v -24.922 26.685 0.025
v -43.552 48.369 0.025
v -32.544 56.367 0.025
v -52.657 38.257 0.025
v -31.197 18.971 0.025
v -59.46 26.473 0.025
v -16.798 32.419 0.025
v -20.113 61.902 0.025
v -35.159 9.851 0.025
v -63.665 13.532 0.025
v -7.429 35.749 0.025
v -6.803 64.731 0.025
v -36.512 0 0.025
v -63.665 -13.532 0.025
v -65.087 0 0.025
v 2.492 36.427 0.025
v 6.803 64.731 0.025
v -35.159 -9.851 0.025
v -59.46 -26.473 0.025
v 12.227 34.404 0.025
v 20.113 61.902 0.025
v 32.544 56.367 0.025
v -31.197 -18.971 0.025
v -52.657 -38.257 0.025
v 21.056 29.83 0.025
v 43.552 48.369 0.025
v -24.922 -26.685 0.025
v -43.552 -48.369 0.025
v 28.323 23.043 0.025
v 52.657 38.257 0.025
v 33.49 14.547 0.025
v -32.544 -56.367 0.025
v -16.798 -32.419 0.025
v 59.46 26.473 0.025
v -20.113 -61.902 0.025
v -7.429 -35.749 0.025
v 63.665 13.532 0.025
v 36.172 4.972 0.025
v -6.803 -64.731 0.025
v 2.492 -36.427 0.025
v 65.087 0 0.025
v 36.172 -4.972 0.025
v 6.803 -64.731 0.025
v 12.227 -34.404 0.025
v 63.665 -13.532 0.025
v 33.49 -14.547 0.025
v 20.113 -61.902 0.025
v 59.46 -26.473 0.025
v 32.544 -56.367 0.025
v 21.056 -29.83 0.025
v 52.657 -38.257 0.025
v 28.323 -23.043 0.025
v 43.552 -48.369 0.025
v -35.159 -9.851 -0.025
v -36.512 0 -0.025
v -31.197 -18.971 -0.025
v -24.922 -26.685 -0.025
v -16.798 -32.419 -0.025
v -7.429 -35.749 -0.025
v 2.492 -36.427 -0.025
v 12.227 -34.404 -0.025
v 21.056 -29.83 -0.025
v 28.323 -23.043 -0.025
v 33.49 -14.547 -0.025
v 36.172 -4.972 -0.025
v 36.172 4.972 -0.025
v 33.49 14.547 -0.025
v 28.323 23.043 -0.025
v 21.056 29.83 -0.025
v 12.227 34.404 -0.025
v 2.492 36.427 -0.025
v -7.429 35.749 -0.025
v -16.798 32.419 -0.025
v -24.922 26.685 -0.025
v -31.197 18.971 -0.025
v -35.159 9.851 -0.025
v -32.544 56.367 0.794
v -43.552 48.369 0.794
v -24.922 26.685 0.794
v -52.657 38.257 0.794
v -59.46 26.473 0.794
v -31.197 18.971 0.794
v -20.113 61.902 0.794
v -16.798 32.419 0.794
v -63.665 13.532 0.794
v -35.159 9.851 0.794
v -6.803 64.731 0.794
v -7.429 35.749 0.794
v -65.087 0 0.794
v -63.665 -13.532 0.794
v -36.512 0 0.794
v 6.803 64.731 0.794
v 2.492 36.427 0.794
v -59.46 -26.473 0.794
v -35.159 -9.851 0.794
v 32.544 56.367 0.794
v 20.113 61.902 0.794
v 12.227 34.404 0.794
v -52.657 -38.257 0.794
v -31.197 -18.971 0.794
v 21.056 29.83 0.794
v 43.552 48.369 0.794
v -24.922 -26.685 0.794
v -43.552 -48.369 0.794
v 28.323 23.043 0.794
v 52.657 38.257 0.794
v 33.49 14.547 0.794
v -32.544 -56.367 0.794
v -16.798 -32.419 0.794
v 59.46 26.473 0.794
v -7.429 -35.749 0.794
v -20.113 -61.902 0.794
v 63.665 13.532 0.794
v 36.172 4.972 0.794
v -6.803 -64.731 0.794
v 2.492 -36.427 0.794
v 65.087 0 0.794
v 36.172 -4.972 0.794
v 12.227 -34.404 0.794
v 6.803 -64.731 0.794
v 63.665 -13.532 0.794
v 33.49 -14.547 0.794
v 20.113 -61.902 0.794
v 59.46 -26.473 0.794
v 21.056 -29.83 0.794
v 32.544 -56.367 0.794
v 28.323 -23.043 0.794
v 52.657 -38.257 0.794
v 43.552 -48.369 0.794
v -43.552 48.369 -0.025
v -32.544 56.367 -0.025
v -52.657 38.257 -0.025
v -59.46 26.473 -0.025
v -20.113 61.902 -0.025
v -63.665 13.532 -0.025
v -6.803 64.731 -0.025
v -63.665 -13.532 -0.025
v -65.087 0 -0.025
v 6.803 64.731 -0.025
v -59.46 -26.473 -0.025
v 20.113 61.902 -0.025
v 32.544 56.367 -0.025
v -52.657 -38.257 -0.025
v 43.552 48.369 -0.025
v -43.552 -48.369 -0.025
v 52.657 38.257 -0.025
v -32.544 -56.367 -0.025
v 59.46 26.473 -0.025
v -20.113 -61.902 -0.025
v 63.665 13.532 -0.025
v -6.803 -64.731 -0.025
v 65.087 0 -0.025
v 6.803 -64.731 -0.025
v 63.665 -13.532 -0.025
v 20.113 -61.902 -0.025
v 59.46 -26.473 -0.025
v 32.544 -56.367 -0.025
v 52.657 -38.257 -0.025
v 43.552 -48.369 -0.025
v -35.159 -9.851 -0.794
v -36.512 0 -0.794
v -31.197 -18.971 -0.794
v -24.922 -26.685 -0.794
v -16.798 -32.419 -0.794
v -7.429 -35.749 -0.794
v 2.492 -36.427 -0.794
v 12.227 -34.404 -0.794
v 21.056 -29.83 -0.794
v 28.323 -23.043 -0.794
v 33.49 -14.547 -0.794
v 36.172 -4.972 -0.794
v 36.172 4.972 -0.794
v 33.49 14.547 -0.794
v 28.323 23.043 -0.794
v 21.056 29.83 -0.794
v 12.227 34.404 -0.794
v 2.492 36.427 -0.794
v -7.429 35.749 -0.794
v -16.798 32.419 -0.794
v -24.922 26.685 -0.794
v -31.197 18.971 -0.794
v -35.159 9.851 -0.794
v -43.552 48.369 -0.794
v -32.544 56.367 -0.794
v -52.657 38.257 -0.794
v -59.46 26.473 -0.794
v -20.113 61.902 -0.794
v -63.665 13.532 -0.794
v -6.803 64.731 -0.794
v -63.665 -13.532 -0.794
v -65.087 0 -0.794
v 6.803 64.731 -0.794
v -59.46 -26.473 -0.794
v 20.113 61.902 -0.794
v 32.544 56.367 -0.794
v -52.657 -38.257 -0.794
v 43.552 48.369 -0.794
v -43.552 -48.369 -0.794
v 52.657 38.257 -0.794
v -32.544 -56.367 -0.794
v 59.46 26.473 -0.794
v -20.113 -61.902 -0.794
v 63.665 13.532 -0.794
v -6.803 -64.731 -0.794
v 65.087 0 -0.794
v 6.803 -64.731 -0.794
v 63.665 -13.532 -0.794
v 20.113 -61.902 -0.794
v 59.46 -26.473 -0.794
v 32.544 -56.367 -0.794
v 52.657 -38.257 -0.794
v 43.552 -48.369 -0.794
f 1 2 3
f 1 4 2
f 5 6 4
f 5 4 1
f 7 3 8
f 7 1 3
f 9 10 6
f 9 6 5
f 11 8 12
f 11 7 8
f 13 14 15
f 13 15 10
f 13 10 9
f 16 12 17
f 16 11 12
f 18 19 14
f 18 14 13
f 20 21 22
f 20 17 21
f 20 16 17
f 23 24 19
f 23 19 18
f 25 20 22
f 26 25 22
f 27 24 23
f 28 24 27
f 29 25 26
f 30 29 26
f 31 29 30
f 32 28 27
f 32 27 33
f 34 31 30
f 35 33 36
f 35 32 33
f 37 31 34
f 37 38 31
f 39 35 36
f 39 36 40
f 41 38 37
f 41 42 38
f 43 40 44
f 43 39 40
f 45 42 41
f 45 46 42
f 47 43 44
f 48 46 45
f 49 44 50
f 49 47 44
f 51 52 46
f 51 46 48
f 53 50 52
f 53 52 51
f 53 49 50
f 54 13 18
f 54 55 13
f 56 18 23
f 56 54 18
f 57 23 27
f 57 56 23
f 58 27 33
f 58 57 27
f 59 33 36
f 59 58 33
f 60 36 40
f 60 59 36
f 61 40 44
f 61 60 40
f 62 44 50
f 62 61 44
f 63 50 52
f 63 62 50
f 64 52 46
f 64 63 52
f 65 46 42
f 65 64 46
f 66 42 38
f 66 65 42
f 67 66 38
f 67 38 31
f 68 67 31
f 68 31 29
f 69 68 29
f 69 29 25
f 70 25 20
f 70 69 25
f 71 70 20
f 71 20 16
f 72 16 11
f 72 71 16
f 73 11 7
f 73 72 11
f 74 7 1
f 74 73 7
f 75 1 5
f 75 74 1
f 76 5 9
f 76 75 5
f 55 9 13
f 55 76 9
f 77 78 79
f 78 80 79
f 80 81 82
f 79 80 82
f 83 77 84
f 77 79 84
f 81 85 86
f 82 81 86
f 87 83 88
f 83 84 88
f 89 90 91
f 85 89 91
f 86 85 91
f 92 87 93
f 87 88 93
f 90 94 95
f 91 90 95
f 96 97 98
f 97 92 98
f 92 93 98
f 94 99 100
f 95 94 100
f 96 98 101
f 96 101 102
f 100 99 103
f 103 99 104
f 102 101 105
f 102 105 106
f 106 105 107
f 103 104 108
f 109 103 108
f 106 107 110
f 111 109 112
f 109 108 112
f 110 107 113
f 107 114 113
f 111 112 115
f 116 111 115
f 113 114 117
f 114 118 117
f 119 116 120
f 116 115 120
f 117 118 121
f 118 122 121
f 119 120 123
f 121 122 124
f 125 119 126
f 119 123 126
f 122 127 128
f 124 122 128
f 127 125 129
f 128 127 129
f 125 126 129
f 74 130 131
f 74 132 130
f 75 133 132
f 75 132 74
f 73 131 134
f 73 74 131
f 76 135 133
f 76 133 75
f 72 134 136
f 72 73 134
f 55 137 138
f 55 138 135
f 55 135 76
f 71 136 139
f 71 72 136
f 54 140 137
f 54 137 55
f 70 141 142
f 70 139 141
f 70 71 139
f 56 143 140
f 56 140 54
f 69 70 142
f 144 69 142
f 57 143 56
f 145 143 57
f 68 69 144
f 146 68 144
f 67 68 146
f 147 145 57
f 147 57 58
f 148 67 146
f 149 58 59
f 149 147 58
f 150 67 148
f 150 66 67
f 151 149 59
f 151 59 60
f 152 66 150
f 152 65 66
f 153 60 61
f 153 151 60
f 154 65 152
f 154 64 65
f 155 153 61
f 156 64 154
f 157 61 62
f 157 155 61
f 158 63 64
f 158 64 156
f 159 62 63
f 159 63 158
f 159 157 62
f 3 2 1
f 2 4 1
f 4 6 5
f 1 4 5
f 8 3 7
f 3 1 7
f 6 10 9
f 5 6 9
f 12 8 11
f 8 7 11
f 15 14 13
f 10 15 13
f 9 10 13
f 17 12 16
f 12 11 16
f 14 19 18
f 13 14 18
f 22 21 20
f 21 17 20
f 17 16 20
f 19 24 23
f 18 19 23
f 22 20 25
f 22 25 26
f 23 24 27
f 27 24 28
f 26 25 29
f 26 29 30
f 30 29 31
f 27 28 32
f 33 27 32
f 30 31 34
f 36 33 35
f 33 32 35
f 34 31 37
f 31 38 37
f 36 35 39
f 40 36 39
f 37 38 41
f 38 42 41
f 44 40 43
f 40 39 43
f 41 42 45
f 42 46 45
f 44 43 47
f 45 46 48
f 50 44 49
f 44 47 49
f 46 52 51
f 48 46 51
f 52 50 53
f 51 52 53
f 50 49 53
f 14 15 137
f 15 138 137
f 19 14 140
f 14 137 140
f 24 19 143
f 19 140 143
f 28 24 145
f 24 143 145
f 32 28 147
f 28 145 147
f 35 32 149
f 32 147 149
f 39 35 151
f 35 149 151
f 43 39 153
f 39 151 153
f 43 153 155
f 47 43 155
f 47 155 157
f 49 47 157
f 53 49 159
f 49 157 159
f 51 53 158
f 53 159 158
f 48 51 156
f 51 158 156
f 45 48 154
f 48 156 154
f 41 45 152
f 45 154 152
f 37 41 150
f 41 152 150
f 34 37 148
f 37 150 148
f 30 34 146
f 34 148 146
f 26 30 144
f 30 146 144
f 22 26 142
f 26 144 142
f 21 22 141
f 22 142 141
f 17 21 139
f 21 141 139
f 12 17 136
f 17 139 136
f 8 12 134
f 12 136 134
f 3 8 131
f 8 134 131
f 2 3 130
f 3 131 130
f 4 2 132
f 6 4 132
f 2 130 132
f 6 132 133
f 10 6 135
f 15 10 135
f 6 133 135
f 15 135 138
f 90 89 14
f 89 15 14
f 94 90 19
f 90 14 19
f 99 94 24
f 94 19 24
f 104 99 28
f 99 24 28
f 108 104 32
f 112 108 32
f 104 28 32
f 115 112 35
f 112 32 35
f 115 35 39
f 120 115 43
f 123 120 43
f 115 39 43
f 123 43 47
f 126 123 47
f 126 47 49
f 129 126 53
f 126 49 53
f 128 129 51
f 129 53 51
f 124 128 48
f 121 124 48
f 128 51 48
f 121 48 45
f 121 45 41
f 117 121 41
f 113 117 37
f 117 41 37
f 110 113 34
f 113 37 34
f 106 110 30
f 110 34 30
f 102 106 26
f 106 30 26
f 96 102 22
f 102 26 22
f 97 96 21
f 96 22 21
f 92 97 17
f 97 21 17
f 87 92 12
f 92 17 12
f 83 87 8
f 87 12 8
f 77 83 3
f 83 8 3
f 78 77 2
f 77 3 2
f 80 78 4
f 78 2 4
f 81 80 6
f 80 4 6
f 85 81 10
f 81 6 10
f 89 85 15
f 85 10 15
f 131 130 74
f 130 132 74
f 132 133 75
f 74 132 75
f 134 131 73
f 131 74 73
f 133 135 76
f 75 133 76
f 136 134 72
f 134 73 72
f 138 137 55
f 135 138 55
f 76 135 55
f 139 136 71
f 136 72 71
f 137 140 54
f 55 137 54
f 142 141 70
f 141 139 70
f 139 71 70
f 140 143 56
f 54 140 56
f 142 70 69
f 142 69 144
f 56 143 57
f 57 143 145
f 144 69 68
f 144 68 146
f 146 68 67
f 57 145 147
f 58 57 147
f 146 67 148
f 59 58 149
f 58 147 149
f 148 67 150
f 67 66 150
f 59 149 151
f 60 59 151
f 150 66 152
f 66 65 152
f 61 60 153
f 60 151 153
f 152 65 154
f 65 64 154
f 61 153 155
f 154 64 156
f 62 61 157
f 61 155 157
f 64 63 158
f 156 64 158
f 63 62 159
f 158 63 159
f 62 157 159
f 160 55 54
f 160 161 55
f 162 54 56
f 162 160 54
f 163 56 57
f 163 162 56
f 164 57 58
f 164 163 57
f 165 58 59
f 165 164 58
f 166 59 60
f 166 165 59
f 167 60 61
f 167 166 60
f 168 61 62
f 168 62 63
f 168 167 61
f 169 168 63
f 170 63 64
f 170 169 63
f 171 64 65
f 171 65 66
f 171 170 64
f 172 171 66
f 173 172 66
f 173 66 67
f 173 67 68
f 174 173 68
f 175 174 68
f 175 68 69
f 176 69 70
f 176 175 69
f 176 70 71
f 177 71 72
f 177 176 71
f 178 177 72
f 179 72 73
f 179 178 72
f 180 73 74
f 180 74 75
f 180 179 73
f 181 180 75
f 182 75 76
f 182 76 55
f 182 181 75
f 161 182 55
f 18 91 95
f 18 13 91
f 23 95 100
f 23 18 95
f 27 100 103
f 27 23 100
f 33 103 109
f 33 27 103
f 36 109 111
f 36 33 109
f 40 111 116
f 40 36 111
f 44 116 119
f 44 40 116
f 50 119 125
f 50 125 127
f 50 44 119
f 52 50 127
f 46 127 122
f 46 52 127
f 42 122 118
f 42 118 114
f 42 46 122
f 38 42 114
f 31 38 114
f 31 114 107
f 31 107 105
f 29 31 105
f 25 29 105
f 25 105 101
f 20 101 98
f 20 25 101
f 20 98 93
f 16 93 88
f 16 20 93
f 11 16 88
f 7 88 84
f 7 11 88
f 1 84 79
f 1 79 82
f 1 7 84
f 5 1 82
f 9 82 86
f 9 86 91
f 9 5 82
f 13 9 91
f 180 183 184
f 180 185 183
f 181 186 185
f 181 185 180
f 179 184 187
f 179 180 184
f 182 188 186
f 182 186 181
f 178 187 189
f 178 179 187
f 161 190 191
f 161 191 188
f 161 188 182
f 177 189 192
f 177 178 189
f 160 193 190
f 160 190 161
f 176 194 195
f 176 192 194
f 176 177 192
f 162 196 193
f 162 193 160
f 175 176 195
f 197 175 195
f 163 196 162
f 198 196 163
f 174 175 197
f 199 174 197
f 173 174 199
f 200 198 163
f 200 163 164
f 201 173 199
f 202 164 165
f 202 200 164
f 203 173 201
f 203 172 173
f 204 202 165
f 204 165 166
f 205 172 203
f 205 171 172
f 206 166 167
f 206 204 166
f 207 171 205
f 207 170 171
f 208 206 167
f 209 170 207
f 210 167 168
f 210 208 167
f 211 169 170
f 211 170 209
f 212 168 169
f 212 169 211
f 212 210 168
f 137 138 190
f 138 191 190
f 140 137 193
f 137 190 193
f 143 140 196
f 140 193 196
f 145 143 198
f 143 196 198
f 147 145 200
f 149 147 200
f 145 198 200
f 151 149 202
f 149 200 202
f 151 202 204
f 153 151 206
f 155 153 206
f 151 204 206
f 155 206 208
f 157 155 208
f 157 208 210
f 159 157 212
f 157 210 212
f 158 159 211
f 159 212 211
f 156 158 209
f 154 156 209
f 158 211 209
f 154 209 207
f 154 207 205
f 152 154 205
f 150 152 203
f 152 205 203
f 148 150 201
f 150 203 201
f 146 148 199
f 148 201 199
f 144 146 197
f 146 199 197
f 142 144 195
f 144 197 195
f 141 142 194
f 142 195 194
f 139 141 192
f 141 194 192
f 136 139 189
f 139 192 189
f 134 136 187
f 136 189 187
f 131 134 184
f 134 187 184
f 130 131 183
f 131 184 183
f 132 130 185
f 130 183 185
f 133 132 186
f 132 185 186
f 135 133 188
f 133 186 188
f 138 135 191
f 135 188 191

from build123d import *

# Parameters (mm, degrees)
SKETCH3_W = 0.0508
SKETCH3_H = 28.575
SKETCH4_W = 0.76835
SKETCH4_H = 28.575


with BuildPart() as part:
    # Sketch3 → Revolve1 (revolve)
    with BuildSketch(Plane(origin=(0, 0, 0), x_dir=(0, 0, -1), z_dir=(1, 0, 0)), mode=Mode.PRIVATE) as revolve1_sk:
        with Locations((0, 50.8)):
            Rectangle(SKETCH3_W, SKETCH3_H)
    revolve(revolve1_sk.sketch.rotate(Axis((0, 0, -0.79375), (0, 0, 1)), 90), axis=Axis((0, 0, -0.79375), (0, 0, 1)))


with BuildPart() as body_2:
    # Sketch4 → Revolve2 (revolve)
    with BuildSketch(Plane(origin=(0, 0, 0), x_dir=(0, 0, -1), z_dir=(1, 0, 0)), mode=Mode.PRIVATE) as revolve2_sk:
        with Locations((-0.409575, 50.8)):
            Rectangle(SKETCH4_W, SKETCH4_H)
        with Locations((0.409575, 50.8)):
            Rectangle(SKETCH4_W, SKETCH4_H)
    revolve(revolve2_sk.sketch.rotate(Axis((0, 0, -0.79375), (0, 0, 1)), 90), axis=Axis((0, 0, -0.79375), (0, 0, 1)))


solid = Compound([part.part, body_2.part])
